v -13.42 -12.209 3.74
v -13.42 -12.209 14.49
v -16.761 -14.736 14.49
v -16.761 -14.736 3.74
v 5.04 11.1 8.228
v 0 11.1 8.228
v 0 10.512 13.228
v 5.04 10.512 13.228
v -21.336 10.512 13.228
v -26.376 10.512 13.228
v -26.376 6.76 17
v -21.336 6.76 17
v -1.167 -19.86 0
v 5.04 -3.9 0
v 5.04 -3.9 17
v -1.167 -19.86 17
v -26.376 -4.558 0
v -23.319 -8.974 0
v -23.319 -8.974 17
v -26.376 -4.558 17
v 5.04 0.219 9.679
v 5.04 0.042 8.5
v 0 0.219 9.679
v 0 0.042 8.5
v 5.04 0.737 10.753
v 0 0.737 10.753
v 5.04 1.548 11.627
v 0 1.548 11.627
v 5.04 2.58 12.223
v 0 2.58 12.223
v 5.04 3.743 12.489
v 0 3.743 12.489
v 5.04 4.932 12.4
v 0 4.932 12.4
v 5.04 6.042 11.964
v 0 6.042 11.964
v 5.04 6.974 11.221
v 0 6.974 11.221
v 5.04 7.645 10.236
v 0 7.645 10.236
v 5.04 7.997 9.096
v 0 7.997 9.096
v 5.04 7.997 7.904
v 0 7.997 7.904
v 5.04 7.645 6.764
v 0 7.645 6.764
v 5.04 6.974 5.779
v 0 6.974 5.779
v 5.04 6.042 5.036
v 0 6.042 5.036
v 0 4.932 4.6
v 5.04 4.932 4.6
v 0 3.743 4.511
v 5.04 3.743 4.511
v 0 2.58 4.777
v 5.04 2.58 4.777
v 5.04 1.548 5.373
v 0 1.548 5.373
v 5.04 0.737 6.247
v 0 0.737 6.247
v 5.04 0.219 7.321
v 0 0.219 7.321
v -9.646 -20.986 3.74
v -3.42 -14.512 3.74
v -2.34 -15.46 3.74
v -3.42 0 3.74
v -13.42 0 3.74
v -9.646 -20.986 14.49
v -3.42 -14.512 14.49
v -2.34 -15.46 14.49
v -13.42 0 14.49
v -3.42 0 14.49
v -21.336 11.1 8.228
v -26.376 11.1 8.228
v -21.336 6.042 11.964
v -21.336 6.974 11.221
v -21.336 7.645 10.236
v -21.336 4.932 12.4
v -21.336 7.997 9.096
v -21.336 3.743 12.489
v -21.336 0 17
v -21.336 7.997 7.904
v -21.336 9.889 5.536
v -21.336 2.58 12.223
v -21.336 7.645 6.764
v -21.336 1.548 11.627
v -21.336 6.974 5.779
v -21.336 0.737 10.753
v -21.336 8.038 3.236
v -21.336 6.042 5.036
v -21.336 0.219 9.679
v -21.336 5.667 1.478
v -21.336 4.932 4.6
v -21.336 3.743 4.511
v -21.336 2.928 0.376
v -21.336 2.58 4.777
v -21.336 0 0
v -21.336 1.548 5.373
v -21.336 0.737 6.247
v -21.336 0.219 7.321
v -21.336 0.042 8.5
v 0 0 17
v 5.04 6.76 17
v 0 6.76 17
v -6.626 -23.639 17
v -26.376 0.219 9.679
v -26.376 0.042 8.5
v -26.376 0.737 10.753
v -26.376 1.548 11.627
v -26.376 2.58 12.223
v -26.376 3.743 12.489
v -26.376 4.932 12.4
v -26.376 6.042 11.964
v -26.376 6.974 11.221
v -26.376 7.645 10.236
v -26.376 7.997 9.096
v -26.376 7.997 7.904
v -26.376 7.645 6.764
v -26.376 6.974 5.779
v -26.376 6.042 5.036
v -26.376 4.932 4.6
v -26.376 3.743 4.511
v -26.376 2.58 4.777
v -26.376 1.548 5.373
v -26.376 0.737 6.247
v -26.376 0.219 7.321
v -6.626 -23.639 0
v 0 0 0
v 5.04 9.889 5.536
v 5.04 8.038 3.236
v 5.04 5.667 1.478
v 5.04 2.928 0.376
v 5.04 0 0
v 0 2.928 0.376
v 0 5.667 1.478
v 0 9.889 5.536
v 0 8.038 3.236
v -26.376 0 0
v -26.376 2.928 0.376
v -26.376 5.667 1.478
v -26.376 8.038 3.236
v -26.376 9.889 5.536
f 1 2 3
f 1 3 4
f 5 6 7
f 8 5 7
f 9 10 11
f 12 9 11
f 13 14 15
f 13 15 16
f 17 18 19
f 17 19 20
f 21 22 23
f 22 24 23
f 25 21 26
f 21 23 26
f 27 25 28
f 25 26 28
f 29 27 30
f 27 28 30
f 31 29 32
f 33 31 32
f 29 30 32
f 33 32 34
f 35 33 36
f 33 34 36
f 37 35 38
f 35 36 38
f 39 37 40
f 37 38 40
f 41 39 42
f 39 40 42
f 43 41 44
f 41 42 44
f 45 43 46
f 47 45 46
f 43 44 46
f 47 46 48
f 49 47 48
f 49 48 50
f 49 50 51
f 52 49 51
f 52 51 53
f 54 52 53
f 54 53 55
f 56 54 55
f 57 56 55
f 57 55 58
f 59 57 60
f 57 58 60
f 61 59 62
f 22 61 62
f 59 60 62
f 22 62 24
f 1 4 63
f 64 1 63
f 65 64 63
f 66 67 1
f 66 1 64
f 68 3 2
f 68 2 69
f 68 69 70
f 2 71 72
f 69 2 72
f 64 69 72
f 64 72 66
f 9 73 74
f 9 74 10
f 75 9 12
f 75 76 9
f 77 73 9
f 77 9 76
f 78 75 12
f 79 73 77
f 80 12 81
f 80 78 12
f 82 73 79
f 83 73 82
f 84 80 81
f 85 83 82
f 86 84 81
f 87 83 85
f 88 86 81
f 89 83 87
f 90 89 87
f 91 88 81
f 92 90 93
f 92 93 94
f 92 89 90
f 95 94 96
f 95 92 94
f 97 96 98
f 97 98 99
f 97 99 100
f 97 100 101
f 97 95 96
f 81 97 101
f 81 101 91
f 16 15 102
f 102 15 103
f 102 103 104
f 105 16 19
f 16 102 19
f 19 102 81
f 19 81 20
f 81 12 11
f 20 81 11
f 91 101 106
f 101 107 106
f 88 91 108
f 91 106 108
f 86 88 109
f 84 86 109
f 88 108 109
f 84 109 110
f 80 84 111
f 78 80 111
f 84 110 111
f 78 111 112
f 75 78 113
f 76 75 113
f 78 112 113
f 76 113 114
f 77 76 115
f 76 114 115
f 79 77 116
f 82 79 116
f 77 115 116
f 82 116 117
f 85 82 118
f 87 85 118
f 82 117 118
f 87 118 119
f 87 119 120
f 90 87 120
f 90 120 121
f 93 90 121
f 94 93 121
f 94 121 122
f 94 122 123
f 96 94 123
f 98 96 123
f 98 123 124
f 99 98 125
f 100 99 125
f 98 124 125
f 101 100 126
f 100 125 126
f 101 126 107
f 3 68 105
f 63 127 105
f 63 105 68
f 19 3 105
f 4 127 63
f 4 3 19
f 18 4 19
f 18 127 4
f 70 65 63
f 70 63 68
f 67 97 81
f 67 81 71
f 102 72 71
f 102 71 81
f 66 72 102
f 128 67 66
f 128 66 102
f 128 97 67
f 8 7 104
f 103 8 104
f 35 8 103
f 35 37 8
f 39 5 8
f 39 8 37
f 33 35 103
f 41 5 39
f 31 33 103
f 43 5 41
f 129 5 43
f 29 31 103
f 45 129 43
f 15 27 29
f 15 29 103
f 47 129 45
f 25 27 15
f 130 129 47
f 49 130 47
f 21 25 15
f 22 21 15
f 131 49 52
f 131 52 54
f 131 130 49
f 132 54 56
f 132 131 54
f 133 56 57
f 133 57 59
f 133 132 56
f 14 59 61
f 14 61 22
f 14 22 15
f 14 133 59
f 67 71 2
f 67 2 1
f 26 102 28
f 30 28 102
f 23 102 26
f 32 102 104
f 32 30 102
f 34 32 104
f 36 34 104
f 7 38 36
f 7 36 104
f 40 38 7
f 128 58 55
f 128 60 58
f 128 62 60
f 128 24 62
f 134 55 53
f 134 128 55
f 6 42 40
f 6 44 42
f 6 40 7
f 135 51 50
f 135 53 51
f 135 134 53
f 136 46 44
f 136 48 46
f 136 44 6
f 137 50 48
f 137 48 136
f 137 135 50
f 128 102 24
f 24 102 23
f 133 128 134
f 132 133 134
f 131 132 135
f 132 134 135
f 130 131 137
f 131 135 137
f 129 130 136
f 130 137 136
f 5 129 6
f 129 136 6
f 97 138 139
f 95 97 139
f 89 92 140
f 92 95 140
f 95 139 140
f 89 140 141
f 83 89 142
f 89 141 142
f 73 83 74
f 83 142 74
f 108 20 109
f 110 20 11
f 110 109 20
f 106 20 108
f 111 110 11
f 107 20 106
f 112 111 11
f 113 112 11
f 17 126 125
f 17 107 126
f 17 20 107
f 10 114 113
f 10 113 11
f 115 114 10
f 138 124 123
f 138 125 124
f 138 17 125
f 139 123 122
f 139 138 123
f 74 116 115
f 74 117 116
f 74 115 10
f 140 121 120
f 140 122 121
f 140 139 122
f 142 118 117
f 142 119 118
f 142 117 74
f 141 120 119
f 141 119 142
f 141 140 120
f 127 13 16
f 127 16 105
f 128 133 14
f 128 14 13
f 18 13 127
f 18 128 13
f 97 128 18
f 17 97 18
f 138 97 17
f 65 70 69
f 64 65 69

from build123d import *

# Parameters (mm, degrees)
BOSS_EXTRUDE1_DEPTH = 17
CUT_EXTRUDE1_DEPTH  = 31
SKETCH3_W           = 9.47
SKETCH3_H           = 10.75
CUT_EXTRUDE2_REACH  = 41.287
SKETCH6_W           = 10
SKETCH6_H           = 10.75
SKETCH7_R           = 4
CUT_EXTRUDE3_DEPTH  = 31


with BuildPart() as part:
    # Sketch1 → Boss-Extrude1 (new body)
    with BuildSketch(Plane.XY):
        Polygon((0, 0), (0, 11.1), (5.04, 11.1), (5.04, -3.9), (-1.16650456, -19.86), (-6.626200647, -23.639063196), (-23.319289693, -8.973826134), (-26.37555014, -4.558379149), (-26.37555014, 11.1), (-21.33555014, 11.1), (-21.33555014, 0), align=None)
    extrude(amount=BOSS_EXTRUDE1_DEPTH)

    # Sketch2 → Cut-Extrude1 (cut, symmetric)
    with BuildSketch(Plane.ZY):
        Polygon((8.228054067, 11.1), (17, 11.1), (17, 12.88110255), (0, 12.88110255), (0, 11.1), align=None)
        with BuildLine():
            ThreePointArc((0, 0), (2.28131811, 6.908525055), (8.228054067, 11.1))
            Line((8.228054067, 11.1), (0, 11.1))
            Line((0, 11.1), (0, 0))
        make_face()
        Polygon((13.228054067, 10.512247596), (17, 6.76), (17, 11.1), (8.228054067, 11.1), align=None)
    extrude(amount=CUT_EXTRUDE1_DEPTH, both=True, mode=Mode.SUBTRACT)

    # Cut-Sweep1: sweep along a path in Sketch5
    with BuildLine(Plane.XY.offset(7)) as cut_sweep1_path:
        Line((-11.079626433, -19.726633046), (-3.773757644, -14.201247879))
    # Sketch3 → Cut-Sweep1 (sweep, cut)
    with BuildSketch(Plane(origin=(-14.60747623, -16.627341271, 0), x_dir=(-0.7512641335035073, 0.6600016679609412, 0), z_dir=(-0.6600016679609412, -0.7512641335035074, 0))):
        with Locations((-1.868794251, -9.115)):
            Rectangle(SKETCH3_W, SKETCH3_H)
    sweep(path=cut_sweep1_path.line, mode=Mode.SUBTRACT)

    # Cut-Extrude2: up to this face of the body (flat: up to its plane)
    cut_extrude2_end = Plane(part.part.faces().sort_by_distance((-5.99334807, -18.223163907, 9.115))[0])
    # Sketch6 → Cut-Extrude2 (cut, up to the picked face)
    with BuildSketch(Plane(origin=(0, 0, 0), x_dir=(1, 0, 0), z_dir=(0, 1, 0)), mode=Mode.PRIVATE) as cut_extrude2_sk1:
        with Locations((-8.42, -9.115)):
            Rectangle(SKETCH6_W, SKETCH6_H)
    cut_extrude2_tool1 = split(extrude(cut_extrude2_sk1.sketch, amount=-CUT_EXTRUDE2_REACH, mode=Mode.PRIVATE), bisect_by=cut_extrude2_end, keep=Keep.BOTH, mode=Mode.PRIVATE)
    add(cut_extrude2_tool1.solids().sort_by(Axis((-8.42, 0, 9.115), (0, -1, 0)))[0], mode=Mode.SUBTRACT)

    # Sketch7 → Cut-Extrude3 (cut, symmetric)
    with BuildSketch(Plane.ZY.offset(10.66777507)):
        with Locations(Location((8.5, 4.041620851, 0), (0, 0, 270))):
            Circle(SKETCH7_R)
    extrude(amount=CUT_EXTRUDE3_DEPTH, both=True, mode=Mode.SUBTRACT)


solid = part.part
